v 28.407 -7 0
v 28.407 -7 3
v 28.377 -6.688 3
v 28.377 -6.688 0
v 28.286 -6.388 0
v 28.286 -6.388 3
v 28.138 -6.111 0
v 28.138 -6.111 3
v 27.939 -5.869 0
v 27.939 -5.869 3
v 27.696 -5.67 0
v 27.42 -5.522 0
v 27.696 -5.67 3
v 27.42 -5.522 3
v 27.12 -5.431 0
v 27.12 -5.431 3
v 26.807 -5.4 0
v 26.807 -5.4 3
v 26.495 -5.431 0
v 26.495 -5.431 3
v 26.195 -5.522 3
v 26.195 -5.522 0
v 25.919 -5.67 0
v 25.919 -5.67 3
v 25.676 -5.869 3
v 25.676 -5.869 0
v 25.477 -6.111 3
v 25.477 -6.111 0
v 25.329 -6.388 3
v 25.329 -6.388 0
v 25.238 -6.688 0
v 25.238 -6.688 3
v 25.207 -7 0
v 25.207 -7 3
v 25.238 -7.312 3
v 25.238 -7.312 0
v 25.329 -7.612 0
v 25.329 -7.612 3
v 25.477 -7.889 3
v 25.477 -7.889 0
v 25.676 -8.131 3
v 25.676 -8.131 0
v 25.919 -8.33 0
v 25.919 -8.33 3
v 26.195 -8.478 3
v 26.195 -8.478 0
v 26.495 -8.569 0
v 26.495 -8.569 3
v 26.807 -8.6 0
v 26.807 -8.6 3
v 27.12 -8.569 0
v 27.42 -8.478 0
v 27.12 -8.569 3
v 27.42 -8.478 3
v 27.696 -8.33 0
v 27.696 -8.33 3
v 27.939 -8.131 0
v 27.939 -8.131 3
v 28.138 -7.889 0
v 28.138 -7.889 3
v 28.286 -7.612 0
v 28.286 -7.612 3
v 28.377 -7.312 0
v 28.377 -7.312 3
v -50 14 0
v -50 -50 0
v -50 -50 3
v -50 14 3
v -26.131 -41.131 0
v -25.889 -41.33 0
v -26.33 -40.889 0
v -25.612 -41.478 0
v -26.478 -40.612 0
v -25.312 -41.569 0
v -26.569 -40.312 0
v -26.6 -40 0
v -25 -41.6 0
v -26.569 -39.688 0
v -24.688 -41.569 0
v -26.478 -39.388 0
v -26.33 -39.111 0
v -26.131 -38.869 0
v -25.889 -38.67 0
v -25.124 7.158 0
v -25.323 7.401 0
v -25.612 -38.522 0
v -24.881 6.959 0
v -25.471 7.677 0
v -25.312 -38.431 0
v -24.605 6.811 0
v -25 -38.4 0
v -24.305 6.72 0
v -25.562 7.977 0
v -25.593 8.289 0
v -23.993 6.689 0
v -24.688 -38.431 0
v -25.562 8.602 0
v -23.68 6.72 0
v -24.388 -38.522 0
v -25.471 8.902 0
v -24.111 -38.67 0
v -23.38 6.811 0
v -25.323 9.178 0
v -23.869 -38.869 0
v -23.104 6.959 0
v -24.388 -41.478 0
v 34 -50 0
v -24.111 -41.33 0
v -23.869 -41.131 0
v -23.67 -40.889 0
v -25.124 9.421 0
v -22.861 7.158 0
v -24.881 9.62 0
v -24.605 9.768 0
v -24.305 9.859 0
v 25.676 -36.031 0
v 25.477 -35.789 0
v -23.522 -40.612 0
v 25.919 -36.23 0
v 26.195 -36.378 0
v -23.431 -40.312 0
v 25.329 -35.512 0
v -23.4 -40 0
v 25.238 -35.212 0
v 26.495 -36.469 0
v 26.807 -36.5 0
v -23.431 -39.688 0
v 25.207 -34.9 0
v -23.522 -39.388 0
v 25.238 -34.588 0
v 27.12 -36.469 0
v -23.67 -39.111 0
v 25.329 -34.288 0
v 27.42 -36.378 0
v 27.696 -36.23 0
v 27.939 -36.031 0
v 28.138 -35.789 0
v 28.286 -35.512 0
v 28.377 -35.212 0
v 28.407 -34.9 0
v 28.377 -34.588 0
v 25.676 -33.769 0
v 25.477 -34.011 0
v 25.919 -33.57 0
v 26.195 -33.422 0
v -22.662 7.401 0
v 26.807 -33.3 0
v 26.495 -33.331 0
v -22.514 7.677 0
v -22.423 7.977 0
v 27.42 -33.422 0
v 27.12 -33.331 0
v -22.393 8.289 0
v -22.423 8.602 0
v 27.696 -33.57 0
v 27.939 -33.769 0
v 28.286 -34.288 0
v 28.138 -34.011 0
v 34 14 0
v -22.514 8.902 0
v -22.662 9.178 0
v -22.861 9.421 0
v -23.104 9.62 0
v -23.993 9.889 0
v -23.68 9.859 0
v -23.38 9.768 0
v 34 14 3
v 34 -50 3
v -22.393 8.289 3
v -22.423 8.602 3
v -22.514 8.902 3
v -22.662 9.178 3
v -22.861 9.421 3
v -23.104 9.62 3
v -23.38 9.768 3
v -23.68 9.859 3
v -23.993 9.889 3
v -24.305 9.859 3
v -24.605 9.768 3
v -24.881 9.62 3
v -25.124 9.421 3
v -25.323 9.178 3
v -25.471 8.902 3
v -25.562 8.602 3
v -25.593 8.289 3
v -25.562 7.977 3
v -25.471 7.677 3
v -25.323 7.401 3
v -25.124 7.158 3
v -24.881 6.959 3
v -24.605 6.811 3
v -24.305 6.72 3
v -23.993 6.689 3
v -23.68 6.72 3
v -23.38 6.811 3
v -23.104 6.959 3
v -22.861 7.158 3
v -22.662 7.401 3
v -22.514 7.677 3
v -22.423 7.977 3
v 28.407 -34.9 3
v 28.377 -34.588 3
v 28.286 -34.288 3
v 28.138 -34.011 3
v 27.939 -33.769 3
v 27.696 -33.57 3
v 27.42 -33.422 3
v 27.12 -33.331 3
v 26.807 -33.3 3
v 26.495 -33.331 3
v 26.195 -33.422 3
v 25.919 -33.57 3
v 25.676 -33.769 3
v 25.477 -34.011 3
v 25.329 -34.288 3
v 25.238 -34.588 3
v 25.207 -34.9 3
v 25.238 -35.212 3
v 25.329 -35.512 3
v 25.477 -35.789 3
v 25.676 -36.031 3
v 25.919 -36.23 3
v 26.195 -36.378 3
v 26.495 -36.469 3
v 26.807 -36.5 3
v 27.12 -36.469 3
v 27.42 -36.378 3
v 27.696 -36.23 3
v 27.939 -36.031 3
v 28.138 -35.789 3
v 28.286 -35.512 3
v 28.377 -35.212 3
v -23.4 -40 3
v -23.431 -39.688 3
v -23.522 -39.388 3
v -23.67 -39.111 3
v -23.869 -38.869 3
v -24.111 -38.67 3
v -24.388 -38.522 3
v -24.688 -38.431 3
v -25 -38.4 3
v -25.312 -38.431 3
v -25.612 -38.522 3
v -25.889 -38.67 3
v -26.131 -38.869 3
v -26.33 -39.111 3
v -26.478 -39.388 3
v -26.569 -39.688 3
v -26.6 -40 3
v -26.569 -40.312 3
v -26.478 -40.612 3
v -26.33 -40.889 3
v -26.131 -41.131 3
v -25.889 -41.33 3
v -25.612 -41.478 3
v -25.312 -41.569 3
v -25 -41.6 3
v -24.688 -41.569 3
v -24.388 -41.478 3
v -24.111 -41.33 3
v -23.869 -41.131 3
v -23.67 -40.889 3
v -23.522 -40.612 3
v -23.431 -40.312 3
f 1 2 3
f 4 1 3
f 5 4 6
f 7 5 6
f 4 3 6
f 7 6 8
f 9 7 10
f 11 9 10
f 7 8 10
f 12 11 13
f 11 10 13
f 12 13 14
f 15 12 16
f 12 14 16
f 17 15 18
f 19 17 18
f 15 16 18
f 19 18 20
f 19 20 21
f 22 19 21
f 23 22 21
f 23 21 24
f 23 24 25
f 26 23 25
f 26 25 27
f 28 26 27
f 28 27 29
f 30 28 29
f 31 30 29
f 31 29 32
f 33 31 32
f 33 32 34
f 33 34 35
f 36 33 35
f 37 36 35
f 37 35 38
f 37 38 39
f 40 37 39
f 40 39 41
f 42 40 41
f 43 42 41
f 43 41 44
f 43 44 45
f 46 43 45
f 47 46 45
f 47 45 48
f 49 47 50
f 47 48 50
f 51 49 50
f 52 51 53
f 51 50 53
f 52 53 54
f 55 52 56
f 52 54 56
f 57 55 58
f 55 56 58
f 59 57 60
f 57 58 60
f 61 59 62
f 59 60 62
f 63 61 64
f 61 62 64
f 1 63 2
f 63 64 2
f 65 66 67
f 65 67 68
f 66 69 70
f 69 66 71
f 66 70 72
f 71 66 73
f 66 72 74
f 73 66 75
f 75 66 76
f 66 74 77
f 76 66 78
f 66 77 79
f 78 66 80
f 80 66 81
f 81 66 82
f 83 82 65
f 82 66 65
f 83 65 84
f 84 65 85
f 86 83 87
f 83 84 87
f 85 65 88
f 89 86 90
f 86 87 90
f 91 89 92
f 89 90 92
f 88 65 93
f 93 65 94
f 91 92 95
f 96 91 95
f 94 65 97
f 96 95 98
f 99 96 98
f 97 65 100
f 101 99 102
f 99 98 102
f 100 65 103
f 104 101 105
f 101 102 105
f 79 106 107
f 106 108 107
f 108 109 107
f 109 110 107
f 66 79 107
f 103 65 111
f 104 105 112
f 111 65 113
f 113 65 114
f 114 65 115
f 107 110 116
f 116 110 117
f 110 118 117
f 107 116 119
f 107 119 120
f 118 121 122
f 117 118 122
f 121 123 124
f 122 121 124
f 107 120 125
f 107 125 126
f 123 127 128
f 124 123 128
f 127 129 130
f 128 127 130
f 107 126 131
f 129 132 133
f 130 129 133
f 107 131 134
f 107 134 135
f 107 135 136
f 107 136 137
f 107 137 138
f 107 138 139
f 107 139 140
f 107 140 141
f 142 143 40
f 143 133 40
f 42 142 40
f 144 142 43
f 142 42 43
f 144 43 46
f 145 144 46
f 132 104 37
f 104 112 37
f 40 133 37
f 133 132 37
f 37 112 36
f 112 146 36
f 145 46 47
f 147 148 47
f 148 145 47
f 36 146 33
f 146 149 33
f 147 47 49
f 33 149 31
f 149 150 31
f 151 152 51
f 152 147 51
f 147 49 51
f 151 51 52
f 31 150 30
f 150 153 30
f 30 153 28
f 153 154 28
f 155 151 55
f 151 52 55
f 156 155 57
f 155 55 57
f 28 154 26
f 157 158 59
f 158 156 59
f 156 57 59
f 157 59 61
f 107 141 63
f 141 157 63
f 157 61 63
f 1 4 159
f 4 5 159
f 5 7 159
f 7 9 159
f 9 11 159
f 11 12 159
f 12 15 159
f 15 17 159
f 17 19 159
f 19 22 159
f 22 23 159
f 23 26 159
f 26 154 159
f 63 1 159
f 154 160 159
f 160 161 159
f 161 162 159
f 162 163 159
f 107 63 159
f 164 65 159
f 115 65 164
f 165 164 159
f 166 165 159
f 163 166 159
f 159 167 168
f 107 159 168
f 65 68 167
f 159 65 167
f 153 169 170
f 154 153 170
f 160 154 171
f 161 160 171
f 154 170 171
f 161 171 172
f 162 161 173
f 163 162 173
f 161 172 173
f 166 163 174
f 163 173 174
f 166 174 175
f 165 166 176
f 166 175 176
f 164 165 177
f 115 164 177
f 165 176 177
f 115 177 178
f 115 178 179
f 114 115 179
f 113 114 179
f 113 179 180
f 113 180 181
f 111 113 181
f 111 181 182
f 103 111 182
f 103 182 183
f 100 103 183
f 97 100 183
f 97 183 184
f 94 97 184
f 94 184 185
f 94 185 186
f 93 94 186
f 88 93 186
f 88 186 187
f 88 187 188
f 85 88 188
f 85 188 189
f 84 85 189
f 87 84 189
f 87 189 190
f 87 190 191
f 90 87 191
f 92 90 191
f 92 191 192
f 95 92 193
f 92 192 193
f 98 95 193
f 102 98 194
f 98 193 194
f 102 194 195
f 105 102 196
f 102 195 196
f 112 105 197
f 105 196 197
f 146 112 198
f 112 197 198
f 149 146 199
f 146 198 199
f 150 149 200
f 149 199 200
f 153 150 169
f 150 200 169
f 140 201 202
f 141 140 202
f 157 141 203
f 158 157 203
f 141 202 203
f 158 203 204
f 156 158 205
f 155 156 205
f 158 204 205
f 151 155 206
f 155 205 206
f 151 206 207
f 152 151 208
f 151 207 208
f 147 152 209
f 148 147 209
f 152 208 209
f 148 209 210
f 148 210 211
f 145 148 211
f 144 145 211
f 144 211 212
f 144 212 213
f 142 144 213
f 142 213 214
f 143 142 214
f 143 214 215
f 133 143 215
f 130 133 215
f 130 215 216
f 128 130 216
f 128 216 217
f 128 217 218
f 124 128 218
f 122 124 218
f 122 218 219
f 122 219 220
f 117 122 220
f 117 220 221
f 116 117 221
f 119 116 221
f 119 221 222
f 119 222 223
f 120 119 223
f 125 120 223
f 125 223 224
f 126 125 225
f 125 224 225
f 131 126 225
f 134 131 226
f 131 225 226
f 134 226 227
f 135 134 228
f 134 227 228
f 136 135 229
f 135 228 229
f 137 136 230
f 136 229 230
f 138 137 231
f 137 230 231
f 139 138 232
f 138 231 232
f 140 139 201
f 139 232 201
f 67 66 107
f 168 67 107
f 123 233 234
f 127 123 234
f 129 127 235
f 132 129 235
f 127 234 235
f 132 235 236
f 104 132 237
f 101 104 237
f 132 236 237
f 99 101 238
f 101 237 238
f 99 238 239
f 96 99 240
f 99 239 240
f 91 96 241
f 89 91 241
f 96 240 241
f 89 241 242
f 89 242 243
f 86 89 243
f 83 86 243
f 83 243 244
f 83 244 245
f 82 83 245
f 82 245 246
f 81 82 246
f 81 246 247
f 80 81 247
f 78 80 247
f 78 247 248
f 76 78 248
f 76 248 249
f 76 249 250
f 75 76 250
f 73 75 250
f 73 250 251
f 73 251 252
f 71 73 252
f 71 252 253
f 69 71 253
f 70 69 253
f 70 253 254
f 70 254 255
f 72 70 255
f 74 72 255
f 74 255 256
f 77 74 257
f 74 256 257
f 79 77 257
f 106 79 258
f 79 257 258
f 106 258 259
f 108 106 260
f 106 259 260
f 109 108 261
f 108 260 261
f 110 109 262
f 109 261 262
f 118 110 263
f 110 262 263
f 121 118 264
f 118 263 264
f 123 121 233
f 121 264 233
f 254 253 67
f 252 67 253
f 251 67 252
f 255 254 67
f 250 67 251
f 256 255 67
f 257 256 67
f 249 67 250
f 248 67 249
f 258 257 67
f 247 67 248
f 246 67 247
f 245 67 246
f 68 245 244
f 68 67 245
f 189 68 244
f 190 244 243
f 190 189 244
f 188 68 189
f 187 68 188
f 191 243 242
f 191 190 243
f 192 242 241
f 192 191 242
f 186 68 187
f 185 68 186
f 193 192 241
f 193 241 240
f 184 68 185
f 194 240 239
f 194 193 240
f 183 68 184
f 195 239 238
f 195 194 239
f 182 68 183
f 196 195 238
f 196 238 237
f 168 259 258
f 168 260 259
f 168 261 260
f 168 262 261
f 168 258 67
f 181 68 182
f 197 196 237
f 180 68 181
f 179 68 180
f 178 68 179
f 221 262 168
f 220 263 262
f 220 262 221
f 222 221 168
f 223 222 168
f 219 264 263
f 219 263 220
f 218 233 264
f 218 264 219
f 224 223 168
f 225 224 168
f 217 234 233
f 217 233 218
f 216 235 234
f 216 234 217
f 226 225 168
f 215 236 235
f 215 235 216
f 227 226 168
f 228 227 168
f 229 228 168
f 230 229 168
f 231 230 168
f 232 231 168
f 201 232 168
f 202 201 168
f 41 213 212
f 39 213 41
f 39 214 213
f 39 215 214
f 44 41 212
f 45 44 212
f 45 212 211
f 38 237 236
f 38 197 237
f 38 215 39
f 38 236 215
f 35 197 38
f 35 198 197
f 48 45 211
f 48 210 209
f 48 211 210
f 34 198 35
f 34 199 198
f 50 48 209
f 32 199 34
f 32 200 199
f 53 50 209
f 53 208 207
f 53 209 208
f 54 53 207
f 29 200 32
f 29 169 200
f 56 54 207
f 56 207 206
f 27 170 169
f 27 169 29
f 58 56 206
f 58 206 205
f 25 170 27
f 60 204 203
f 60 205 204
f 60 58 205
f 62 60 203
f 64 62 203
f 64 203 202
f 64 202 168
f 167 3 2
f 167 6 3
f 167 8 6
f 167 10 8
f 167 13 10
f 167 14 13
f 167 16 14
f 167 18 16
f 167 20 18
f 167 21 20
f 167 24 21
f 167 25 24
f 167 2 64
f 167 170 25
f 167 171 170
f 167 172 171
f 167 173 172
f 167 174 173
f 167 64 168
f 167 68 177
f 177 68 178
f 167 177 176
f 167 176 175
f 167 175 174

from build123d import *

# Parameters (mm, degrees)
SKETCH1_W           = 100
SKETCH1_H           = 100
BOSS_EXTRUDE1_DEPTH = 3
SKETCH2_R           = 1.6
CUT_EXTRUDE1_DEPTH  = 59
CUT_EXTRUDE2_DEPTH  = 3


with BuildPart() as part:
    # Sketch1 → Boss-Extrude1 (new body)
    with BuildSketch(Plane.XY):
        Rectangle(SKETCH1_W, SKETCH1_H)
    extrude(amount=BOSS_EXTRUDE1_DEPTH)

    # Sketch2 → Cut-Extrude1 (cut)
    with BuildSketch(Plane.XY.offset(3)):
        with Locations((26.807477417, -34.9)):
            Circle(SKETCH2_R)
        with Locations((26.807477417, -7)):
            Circle(SKETCH2_R)
        with Locations((-25, -40)):
            Circle(SKETCH2_R)
        with Locations((-23.992522583, 8.289491499)):
            Circle(SKETCH2_R)
    extrude(amount=-CUT_EXTRUDE1_DEPTH, mode=Mode.SUBTRACT)

    # Sketch3 → Cut-Extrude2 (cut)
    with BuildSketch(Plane.XY.offset(3)):
        Polygon((-50, 14), (34, 14), (34, -50), (50, -50), (50, 50), (-50, 50), align=None)
    extrude(amount=-CUT_EXTRUDE2_DEPTH, mode=Mode.SUBTRACT)


solid = part.part
